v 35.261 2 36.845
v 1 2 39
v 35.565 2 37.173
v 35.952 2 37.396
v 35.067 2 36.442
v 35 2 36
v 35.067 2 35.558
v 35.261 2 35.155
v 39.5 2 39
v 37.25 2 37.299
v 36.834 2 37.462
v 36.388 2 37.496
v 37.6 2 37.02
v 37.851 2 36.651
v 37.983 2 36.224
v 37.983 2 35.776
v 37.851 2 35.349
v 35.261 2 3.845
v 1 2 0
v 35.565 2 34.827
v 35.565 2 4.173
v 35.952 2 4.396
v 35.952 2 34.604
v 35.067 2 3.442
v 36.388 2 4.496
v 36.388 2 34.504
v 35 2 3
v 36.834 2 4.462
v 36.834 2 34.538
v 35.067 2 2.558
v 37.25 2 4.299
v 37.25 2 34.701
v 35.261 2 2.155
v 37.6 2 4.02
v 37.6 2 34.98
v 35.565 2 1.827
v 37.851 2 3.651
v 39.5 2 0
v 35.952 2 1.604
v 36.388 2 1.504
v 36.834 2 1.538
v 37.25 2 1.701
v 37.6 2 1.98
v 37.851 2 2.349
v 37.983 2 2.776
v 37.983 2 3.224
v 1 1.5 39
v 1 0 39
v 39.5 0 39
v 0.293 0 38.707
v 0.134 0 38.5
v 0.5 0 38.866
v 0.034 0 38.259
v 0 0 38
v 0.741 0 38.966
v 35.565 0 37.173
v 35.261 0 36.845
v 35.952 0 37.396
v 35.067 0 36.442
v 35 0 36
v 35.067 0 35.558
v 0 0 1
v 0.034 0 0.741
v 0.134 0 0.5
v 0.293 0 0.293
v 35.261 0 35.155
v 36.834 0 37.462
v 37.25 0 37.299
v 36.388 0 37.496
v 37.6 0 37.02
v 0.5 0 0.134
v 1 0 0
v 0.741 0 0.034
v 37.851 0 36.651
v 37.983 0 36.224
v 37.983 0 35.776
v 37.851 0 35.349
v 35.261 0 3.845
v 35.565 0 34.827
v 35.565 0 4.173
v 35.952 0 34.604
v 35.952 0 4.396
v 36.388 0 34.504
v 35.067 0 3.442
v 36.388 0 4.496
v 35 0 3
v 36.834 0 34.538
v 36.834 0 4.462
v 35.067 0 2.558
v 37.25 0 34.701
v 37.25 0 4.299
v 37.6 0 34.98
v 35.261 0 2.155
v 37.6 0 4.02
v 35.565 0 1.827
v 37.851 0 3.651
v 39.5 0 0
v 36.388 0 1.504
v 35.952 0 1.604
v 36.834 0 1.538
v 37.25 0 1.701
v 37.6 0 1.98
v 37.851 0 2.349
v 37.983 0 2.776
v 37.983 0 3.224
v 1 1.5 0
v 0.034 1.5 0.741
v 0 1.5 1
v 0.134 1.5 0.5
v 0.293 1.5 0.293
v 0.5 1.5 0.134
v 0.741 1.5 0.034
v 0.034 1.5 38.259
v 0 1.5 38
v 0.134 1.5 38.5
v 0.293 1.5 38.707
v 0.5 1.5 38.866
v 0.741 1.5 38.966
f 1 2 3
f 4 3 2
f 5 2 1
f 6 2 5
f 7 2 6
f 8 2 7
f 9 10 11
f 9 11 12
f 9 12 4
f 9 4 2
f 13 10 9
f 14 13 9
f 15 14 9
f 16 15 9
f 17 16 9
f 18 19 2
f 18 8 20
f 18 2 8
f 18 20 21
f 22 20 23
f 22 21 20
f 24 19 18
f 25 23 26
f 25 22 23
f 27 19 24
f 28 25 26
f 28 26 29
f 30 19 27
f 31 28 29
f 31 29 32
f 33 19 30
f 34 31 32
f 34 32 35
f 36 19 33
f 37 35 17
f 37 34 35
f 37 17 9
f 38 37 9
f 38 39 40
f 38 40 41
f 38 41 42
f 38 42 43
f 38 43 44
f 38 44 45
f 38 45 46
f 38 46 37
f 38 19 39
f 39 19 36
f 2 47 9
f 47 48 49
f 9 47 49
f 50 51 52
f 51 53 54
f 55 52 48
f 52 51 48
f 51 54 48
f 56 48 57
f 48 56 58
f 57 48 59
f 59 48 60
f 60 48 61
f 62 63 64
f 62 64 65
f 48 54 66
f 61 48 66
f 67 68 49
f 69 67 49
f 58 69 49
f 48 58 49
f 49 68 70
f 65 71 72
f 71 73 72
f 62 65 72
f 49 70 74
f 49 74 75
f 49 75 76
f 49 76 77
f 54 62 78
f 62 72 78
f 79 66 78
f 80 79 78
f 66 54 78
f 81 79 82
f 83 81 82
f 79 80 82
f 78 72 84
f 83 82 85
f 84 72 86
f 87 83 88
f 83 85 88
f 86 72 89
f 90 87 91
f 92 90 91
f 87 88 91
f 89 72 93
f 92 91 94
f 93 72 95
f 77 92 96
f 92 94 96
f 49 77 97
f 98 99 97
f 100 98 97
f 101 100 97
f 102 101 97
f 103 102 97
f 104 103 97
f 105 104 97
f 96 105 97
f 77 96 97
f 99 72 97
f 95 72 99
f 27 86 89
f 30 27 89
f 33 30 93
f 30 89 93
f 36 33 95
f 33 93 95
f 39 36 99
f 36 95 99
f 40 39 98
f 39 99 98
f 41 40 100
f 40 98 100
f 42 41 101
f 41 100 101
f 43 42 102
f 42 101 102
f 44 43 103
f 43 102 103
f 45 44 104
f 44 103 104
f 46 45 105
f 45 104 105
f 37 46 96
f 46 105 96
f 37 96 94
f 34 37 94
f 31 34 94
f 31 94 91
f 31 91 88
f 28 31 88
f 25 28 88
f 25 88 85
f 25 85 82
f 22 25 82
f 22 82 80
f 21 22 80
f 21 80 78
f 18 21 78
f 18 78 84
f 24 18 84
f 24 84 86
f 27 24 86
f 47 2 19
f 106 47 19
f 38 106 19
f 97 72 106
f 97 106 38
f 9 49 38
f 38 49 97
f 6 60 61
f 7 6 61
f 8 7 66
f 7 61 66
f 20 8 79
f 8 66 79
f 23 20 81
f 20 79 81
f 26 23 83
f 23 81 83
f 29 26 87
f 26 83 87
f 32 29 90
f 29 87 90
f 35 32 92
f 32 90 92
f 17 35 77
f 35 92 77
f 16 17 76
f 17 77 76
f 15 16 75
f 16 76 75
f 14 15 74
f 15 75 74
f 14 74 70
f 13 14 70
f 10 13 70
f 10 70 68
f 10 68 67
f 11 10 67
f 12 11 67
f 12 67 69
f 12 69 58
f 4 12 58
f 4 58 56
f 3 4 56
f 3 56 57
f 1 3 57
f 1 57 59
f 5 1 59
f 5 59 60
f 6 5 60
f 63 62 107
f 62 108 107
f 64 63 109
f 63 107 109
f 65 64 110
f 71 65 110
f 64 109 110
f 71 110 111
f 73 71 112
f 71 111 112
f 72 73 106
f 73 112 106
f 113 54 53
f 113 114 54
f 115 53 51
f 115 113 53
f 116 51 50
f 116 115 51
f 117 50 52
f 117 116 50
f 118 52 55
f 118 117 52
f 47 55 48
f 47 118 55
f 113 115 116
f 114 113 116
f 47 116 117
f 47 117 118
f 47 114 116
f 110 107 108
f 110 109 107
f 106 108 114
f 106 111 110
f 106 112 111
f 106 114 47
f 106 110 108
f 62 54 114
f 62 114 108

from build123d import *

# Parameters (mm, degrees)
SKIZZE1_W                       = 39.5
SKIZZE1_H                       = 39
AUFSATZ_LINEAR_AUSTRAGEN1_DEPTH = 2
F_3_0_3_DURCHMESSER_BOHRUNG1_D  = 3
SKIZZE4_W                       = 1
SKIZZE4_H                       = 39
SCHNITT_LINEAR_AUSTRAGEN1_DEPTH = 0.5
VERRUNDUNG1_R                   = 1


with BuildPart() as part:
    # Skizze1 → Aufsatz-Linear austragen1 (new body)
    with BuildSketch(Plane(origin=(0, 0, 0), x_dir=(1, 0, 0), z_dir=(0, 1, 0))):
        with Locations((19.75, -19.5)):
            Rectangle(SKIZZE1_W, SKIZZE1_H)
    extrude(amount=AUFSATZ_LINEAR_AUSTRAGEN1_DEPTH)

    # Ø3.0 (3) Durchmesser Bohrung1 (through all)
    with Locations(Plane(origin=(0, 2, 0), x_dir=(1, 0, 0), z_dir=(0, 1, 0))):
        with Locations((36.5, -3), (36.5, -36)):
            Hole(F_3_0_3_DURCHMESSER_BOHRUNG1_D / 2)

    # Skizze4 → Schnitt-Linear austragen1 (cut)
    with BuildSketch(Plane(origin=(0, 2, 0), x_dir=(1, 0, 0), z_dir=(0, 1, 0))):
        with Locations((0.5, -19.5)):
            Rectangle(SKIZZE4_W, SKIZZE4_H)
    extrude(amount=-SCHNITT_LINEAR_AUSTRAGEN1_DEPTH, mode=Mode.SUBTRACT)

    # Verrundung1
    verrundung1_edges = [part.edges().sort_by_distance(p)[0] for p in [
        (0, 0.75, 0),
        (0, 0.75, 39),
    ]]
    fillet(verrundung1_edges, radius=VERRUNDUNG1_R)


solid = part.part
